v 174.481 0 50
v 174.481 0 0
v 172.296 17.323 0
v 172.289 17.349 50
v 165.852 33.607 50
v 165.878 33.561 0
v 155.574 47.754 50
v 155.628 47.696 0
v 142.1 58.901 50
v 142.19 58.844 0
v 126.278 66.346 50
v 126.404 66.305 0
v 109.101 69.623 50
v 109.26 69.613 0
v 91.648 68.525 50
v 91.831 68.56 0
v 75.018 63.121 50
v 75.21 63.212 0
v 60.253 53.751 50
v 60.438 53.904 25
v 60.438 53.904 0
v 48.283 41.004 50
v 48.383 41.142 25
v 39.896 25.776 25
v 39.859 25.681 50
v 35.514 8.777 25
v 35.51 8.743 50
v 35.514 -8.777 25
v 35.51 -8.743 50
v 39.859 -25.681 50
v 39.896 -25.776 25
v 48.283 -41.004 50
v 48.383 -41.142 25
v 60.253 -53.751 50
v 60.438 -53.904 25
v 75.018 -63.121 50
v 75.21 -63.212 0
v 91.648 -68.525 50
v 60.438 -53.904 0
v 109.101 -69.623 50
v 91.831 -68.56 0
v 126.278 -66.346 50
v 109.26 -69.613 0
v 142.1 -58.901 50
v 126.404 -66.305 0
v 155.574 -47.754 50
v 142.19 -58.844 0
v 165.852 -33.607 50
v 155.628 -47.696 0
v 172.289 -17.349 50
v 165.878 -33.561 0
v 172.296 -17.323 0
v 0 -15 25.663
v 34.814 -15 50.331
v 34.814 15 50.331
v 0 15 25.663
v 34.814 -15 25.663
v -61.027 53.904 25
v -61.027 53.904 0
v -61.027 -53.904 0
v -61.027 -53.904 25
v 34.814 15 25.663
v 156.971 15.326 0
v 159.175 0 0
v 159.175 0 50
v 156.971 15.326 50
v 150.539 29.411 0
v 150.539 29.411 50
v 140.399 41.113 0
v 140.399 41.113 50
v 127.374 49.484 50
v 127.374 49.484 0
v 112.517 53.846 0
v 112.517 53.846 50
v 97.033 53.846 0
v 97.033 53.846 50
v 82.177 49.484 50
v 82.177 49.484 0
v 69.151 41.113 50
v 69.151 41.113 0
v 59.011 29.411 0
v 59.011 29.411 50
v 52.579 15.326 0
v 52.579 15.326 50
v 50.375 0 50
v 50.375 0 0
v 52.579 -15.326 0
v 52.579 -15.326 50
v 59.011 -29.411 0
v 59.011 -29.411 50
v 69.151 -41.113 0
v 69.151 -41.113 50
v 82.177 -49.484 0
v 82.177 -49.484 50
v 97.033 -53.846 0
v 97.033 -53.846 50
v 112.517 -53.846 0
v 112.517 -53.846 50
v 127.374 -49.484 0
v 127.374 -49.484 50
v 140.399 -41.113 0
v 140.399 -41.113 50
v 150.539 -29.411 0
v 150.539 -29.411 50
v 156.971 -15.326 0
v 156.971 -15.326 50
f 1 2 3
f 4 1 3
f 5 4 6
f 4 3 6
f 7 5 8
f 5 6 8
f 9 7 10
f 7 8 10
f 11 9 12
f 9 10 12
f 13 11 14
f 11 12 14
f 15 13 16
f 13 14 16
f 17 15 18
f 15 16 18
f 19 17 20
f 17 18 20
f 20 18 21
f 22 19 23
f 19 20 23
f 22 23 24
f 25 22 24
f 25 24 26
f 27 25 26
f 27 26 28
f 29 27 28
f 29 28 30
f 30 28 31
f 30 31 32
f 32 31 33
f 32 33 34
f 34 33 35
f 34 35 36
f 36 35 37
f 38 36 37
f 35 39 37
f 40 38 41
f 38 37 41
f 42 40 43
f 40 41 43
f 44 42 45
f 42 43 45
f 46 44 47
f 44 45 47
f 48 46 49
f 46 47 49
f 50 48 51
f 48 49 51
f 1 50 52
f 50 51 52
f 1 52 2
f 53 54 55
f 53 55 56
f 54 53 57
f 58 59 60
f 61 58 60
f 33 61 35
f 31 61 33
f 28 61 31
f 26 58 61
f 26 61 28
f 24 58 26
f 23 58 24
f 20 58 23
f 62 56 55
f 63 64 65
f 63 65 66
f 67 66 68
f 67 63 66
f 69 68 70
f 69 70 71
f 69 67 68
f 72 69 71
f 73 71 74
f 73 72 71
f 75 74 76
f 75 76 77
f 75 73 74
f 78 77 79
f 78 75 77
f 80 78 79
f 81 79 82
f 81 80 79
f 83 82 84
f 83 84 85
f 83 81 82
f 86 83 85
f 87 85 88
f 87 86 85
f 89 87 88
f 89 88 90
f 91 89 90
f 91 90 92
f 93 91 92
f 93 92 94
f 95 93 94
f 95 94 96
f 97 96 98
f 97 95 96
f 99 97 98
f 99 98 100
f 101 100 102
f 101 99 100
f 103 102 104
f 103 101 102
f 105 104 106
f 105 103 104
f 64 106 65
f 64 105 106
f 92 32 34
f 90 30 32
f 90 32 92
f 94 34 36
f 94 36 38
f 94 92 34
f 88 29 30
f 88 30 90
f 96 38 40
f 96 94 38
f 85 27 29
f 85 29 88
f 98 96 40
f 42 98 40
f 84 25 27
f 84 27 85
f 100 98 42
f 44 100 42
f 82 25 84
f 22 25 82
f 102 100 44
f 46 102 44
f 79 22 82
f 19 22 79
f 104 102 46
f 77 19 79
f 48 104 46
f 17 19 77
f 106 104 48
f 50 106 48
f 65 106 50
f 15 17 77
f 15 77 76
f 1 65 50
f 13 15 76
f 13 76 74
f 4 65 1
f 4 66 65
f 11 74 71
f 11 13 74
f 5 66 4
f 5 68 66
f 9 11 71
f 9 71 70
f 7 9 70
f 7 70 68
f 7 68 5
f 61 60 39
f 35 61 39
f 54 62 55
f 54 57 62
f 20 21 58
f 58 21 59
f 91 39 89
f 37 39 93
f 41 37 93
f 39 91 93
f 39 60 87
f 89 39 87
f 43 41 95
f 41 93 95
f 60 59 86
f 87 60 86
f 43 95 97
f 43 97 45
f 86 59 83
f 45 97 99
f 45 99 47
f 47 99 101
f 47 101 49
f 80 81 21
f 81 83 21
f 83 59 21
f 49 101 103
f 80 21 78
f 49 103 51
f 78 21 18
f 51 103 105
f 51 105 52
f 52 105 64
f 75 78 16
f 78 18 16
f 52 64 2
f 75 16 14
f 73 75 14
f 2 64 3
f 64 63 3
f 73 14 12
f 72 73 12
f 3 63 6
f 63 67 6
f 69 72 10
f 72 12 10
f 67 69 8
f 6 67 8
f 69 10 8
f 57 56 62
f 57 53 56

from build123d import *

# Parameters (mm, degrees)
F2_DEPTH = 25
F1_R     = 69.760615
F4_DEPTH = 50
F3_R     = 54.399764
F5_DEPTH = 50
F7_DEPTH = 15


with BuildPart() as f2:
    # F0 (on Top) → F2 (new body)
    with BuildSketch(Plane.XY):
        with BuildLine():
            Line((61.027482, 53.90365), (-61.027482, 53.90365))
            Line((-61.027482, 53.90365), (-61.027482, -53.90365))
            Line((-61.027482, -53.90365), (61.027482, -53.90365))
            ThreePointArc((61.027482, -53.90365), (35.531112, 0), (61.027482, 53.90365))
        make_face()
    extrude(amount=F2_DEPTH)

    # F1 (on Top) → F4 (join)
    with BuildSketch(Plane.XY):
        with Locations((104.720309, 0)):
            Circle(F1_R)
    extrude(amount=F4_DEPTH)

    # F3 (on Top) → F5 (cut)
    with BuildSketch(Plane.XY):
        with Locations((104.77522, 0)):
            Circle(F3_R)
    extrude(amount=F5_DEPTH, mode=Mode.SUBTRACT)


with BuildPart() as f7:
    # F6 (on Front) → F7 (new body)
    with BuildSketch(Plane.XZ):
        Polygon((34.814257, 25.663083), (34.814257, 50.33147), (0, 25.663083), align=None)
    extrude(amount=F7_DEPTH)

    # F8: F7 across face


with BuildPart() as f7_1:
    add(f7.part)
    add(f7.part.mirror(Plane(origin=(23.209505, 0, 33.885879), x_dir=(1, 0, 0), z_dir=(0, 1, 0))))


solid = Compound([f2.part, f7_1.part])
